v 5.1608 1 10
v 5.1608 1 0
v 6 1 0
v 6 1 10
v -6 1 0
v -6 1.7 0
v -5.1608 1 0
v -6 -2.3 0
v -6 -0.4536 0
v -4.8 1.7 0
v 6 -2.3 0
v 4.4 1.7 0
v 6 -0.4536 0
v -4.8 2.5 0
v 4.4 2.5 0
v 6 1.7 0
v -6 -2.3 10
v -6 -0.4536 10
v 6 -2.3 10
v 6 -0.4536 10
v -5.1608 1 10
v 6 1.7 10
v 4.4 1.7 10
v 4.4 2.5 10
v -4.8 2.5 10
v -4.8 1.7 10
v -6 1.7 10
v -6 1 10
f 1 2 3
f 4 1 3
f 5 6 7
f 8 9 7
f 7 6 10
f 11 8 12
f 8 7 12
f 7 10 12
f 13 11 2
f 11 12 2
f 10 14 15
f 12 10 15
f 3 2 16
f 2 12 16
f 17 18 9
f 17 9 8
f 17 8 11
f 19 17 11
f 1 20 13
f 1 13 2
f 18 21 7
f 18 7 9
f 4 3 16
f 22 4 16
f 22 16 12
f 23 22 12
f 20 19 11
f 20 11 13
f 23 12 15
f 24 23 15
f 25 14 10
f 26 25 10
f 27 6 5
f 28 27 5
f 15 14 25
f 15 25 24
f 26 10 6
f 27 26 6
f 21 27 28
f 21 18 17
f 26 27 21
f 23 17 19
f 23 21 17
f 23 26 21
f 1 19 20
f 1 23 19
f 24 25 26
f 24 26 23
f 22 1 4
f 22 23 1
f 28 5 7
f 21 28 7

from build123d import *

# Parameters (mm, degrees)
SKETCH_1_W          = 12.4
SKETCH_1_H          = 5
EXTRUDE_1_DEPTH     = 10
SKETCH_2_W          = 1.2
SKETCH_2_H          = 0.6
SKETCH_2_W_2        = 1.6
CUT_EXTRUDE_1_DEPTH = 10


with BuildPart() as part:
    # 草图1 → 凸台-拉伸1 (new body)
    with BuildSketch(Plane.XY):
        Rectangle(SKETCH_1_W, SKETCH_1_H)
    extrude(amount=EXTRUDE_1_DEPTH)

    # 草图2 → 切除-拉伸1 (cut)
    with BuildSketch(Plane(origin=(0, 0, 0), x_dir=(-1, 0, 0), z_dir=(0, 0, -1))):
        with Locations((5.6, 2.2)):
            Rectangle(SKETCH_2_W, SKETCH_2_H)
        Polygon((5, 2.5), (4.8, 2.5), (4.8, 1.7), (6, 1.7), (6, 1), (5.160769515, 1), (6, -0.453589838), (6, -2.3), (-6, -2.3), (-6, -0.453589838), (-5.160769515, 1), (-6, 1), (-6, 1.7), (-4.4, 1.7), (-4.4, 2.5), (-4.6, 2.5), (-4.6, 1.9), (-6.2, 1.9), (-6.2, 0.8), (-5.507179677, 0.8), (-6.2, -0.4), (-6.2, -2.5), (6.2, -2.5), (6.2, -0.4), (5.507179677, 0.8), (6.2, 0.8), (6.2, 1.9), (5, 1.9), align=None)
        Polygon((6.2, -0.4), (6.2, 0.8), (5.507179677, 0.8), align=None)
        Polygon((-5.507179677, 0.8), (-6.2, 0.8), (-6.2, -0.4), align=None)
        with Locations((-5.4, 2.2)):
            Rectangle(SKETCH_2_W_2, SKETCH_2_H)
    extrude(amount=-CUT_EXTRUDE_1_DEPTH, mode=Mode.SUBTRACT)


solid = part.part
